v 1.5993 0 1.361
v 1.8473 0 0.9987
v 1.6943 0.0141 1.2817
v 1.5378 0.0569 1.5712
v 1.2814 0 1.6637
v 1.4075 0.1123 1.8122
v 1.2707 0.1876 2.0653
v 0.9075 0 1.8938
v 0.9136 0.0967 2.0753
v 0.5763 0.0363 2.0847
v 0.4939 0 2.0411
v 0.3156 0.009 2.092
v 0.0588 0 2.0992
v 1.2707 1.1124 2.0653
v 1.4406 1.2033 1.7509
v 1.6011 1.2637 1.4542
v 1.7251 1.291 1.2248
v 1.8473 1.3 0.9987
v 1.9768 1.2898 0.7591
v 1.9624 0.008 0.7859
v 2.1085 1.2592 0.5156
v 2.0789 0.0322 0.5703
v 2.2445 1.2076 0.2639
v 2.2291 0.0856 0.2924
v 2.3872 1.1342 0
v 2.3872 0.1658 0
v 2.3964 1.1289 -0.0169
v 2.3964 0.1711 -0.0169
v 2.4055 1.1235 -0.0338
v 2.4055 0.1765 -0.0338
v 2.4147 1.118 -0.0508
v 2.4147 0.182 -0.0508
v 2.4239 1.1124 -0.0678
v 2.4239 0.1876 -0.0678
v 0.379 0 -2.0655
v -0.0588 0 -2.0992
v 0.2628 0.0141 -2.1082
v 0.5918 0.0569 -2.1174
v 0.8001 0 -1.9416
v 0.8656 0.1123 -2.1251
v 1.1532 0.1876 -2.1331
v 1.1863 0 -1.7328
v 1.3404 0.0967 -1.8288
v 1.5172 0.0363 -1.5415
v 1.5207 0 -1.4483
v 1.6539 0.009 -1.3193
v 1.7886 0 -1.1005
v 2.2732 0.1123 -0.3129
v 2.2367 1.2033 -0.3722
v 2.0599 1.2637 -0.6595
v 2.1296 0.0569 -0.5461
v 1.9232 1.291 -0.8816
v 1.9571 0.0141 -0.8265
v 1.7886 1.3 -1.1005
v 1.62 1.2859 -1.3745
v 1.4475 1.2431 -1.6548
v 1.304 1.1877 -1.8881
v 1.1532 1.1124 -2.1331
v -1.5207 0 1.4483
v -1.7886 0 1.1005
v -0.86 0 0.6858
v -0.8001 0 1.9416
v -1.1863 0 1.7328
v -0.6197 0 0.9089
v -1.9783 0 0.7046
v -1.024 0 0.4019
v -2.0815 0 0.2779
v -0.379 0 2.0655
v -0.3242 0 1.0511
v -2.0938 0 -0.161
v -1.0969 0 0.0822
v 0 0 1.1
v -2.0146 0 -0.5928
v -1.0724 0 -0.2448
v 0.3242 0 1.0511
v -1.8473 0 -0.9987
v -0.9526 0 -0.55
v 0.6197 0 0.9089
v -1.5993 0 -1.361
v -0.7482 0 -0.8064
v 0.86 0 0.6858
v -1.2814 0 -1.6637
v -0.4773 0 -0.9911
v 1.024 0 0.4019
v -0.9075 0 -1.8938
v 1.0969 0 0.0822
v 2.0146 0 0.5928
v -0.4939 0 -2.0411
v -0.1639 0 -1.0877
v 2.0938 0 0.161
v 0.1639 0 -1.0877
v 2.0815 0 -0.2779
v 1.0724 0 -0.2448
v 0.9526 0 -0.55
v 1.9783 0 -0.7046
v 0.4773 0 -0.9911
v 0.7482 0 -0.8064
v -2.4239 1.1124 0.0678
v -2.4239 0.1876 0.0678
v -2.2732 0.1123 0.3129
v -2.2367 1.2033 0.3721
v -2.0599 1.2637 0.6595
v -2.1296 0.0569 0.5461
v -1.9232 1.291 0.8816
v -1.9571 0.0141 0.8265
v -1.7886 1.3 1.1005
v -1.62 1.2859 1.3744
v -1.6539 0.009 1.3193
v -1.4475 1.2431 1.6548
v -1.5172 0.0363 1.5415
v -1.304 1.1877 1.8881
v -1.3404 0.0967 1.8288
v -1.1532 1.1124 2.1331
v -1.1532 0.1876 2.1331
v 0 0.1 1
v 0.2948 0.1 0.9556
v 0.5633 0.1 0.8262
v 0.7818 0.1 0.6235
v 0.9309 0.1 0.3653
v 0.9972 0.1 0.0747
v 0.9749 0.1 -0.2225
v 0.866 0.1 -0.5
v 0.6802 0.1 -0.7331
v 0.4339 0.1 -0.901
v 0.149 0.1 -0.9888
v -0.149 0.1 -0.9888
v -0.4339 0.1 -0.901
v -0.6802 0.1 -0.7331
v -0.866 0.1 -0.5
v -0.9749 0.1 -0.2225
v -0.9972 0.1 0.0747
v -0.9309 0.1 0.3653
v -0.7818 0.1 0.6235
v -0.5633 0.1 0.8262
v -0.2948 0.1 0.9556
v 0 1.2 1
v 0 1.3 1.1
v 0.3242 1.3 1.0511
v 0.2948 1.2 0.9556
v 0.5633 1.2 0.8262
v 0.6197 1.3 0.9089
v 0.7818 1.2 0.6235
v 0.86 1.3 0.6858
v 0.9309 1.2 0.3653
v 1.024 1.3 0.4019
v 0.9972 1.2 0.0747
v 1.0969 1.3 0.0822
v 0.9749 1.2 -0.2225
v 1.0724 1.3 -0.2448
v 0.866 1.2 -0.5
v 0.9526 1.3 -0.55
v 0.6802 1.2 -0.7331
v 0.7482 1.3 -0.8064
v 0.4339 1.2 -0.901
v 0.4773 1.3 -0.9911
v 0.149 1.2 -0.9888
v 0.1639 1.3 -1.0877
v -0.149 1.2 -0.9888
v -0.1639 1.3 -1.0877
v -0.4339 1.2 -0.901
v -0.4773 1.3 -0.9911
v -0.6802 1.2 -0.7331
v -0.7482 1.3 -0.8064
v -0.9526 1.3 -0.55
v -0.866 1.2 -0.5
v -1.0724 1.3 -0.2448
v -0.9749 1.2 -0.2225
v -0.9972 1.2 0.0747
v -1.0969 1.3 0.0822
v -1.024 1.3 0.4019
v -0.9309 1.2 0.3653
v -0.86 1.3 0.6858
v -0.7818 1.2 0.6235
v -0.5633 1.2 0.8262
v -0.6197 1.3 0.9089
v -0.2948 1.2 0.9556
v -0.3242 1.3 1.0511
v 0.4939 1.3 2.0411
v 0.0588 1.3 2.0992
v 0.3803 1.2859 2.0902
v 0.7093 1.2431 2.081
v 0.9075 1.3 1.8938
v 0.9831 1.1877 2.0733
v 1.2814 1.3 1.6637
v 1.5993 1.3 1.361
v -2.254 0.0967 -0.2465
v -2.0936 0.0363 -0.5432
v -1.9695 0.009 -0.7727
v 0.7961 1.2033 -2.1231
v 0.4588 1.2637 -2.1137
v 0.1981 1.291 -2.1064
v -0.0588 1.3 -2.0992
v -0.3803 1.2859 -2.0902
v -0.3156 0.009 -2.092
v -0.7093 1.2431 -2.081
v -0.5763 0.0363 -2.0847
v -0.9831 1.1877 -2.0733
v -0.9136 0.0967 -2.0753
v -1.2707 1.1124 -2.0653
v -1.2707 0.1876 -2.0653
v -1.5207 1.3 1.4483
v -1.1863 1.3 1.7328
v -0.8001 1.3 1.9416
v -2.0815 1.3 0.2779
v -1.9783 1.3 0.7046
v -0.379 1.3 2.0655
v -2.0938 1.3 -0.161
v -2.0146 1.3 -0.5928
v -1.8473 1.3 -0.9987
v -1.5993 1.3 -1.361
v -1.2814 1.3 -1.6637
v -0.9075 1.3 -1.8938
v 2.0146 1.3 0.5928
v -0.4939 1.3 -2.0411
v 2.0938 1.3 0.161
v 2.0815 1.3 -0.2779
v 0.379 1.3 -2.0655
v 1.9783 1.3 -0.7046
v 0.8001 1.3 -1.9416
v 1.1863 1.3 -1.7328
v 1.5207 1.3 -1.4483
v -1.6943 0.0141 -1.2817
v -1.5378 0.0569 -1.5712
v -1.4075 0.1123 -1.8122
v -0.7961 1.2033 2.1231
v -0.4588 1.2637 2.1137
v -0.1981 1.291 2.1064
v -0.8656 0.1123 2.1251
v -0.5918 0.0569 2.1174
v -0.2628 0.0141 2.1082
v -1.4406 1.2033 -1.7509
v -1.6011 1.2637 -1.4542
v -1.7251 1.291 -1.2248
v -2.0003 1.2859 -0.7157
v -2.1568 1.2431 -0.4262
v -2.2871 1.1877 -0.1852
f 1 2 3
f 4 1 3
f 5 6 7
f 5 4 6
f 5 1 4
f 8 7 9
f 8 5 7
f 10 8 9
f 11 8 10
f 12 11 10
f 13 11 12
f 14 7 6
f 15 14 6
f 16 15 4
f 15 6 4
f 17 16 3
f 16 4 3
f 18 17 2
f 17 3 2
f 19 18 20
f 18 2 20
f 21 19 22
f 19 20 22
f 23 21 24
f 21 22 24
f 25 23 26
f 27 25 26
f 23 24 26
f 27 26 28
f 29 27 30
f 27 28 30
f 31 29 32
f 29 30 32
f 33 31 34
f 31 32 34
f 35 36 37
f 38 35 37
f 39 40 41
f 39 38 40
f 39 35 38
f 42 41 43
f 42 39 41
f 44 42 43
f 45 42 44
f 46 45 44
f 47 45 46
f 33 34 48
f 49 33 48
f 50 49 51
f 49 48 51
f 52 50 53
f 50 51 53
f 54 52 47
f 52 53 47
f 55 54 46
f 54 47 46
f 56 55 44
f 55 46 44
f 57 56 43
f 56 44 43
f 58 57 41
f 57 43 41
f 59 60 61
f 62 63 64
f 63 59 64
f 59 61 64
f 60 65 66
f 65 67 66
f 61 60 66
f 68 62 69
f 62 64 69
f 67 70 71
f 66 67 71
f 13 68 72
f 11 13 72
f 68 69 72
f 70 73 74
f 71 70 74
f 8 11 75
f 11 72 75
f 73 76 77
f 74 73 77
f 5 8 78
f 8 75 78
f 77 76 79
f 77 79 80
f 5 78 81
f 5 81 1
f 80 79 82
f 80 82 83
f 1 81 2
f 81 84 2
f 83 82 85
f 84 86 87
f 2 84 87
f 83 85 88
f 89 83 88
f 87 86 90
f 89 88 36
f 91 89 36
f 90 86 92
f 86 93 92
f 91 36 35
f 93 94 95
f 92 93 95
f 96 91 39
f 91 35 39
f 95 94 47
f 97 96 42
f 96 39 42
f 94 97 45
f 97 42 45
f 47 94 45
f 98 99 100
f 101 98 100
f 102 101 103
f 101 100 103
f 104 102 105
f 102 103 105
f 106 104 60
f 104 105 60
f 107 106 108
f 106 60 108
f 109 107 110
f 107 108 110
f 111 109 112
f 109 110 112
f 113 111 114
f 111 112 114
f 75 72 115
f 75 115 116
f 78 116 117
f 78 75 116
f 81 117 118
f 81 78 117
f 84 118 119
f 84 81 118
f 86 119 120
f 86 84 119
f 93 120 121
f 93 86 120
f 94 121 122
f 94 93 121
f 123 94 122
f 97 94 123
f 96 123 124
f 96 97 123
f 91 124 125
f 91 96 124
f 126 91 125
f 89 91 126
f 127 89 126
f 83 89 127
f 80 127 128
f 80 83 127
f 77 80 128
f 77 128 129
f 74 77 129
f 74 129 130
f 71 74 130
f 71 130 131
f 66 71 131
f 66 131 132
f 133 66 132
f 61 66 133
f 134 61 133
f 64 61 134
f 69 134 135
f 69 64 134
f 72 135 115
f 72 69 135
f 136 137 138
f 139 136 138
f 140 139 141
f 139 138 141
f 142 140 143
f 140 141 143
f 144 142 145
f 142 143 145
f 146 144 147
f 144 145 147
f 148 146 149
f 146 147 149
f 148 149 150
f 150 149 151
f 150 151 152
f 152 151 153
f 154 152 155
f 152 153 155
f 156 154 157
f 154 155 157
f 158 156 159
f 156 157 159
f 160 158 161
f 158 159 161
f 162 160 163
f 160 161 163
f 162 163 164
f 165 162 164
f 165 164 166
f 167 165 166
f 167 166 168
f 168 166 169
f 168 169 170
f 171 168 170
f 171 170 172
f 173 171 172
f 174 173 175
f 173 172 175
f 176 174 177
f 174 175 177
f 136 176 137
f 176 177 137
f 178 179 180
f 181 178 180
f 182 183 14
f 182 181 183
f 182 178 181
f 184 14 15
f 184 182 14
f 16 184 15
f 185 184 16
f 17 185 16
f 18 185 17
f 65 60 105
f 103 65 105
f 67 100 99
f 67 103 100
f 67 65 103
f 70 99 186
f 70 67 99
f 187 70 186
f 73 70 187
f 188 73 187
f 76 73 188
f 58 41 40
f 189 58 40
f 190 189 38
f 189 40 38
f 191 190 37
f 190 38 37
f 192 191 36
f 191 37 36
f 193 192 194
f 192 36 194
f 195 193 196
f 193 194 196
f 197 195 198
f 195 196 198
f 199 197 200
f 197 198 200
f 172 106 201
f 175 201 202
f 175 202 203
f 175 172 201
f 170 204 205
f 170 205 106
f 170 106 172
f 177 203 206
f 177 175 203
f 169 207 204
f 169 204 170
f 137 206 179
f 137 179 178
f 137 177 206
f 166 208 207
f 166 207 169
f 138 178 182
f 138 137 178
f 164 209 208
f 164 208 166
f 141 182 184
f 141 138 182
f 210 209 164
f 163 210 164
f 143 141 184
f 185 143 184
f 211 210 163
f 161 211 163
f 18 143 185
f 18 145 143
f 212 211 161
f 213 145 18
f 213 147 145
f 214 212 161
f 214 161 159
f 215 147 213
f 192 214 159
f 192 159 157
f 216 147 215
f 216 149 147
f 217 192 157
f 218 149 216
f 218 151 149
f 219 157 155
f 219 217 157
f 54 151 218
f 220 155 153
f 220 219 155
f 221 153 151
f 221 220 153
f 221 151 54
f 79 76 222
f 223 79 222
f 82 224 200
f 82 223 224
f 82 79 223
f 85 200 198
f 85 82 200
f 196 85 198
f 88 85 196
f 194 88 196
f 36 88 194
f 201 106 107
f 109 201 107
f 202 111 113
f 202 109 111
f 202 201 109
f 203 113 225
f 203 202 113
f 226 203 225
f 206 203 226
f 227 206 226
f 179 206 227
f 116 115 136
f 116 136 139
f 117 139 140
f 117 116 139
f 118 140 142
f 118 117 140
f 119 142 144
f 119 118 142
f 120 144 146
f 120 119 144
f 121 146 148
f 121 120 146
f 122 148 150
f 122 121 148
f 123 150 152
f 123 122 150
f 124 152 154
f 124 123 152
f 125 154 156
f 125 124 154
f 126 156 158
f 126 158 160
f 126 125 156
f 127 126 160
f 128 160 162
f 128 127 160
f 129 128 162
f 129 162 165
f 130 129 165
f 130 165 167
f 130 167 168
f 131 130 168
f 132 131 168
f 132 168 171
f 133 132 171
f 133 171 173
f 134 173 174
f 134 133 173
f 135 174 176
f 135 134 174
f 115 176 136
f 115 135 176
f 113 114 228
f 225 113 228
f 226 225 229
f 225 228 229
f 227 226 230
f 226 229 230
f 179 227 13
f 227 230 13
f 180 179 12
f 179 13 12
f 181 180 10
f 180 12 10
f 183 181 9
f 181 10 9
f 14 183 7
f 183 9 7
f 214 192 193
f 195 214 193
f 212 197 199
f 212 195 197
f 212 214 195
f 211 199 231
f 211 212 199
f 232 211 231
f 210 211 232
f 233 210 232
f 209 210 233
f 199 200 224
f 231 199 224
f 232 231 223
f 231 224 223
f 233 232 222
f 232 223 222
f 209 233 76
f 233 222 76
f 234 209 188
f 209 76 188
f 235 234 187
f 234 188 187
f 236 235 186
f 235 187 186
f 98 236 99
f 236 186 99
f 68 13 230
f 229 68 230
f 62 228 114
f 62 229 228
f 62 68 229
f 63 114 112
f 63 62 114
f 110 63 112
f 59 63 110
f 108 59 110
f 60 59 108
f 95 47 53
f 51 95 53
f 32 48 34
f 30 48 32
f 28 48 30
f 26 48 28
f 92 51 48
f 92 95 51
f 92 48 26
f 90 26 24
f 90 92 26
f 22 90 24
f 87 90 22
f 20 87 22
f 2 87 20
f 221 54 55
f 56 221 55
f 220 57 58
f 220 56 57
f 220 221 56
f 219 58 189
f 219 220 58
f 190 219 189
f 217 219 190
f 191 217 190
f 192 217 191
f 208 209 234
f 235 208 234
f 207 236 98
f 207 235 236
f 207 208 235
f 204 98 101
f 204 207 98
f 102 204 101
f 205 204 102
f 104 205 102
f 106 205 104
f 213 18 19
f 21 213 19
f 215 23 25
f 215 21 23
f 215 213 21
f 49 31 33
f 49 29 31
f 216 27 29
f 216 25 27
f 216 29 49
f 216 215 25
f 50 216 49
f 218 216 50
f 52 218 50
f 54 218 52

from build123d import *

# Parameters (mm, degrees)
SKETCH1_R           = 1
BOSS_EXTRUDE1_DEPTH = 1.3
SKETCH2_OUTSIDE_W   = 624.082
SKETCH2_OUTSIDE_H   = 623.5
SKETCH2_OUTSIDE_R   = 2.1
CUT_EXTRUDE1_DEPTH  = 177.8
CUT_EXTRUDE1_DRAFT  = -60
SKETCH3_OUTSIDE_W   = 624.082
SKETCH3_OUTSIDE_H   = 623.5
SKETCH3_OUTSIDE_R   = 2.1
CUT_EXTRUDE2_DEPTH  = 177.8
CUT_EXTRUDE2_DRAFT  = -60
CHAMFER1_SIZE       = 0.1
CHAMFER2_SIZE       = 0.1


with BuildPart() as part:
    # Sketch1 → Boss-Extrude1 (new body)
    with BuildSketch(Plane(origin=(0, 0, 0), x_dir=(1, 0, 0), z_dir=(0, 1, 0))):
        Polygon((1.153206949, 2.13309956), (-1.270714933, 2.065256294), (-2.423921882, -0.067843266), (-1.153206949, -2.13309956), (1.270714933, -2.065256294), (2.423921882, 0.067843266), align=None)
        with Locations(Location((0, 0, 0), (0, 0, 270))):
            Circle(SKETCH1_R, mode=Mode.SUBTRACT)
    extrude(amount=BOSS_EXTRUDE1_DEPTH)


with BuildPart() as cut_extrude1_tool:
    # Sketch2 outside → Cut-Extrude1 (with draft: the straight prism first)
    with BuildSketch(Plane(origin=(0, 1.3, 0), x_dir=(1, 0, 0), z_dir=(0, 1, 0))):
        Rectangle(SKETCH2_OUTSIDE_W, SKETCH2_OUTSIDE_H)
        Circle(SKETCH2_OUTSIDE_R, mode=Mode.SUBTRACT)
    extrude(amount=-CUT_EXTRUDE1_DEPTH)
    # Cut-Extrude1: the draft: its side faces are tilted about the plane it starts from
    cut_extrude1_sides = [cut_extrude1_tool.faces().sort_by_distance(p)[0] for p in [
        (0, -87.6, 311.75),
        (312.041, -87.6, 0),
        (0, -87.6, -311.75),
        (-312.041, -87.6, 0),
        (-2.1, -87.6, 0),
    ]]
    draft(cut_extrude1_sides, Plane(origin=(0, 1.3, 0), x_dir=(1, 0, 0), z_dir=(0, 1, 0)), CUT_EXTRUDE1_DRAFT)


with BuildPart() as part_1:
    add(part.part)

    # Cut-Extrude1: cut by cut_extrude1_tool
    add(cut_extrude1_tool.part, mode=Mode.SUBTRACT)


with BuildPart() as cut_extrude2_tool:
    # Sketch3 outside → Cut-Extrude2 (with draft: the straight prism first)
    with BuildSketch(Plane.XZ):
        Rectangle(SKETCH3_OUTSIDE_W, SKETCH3_OUTSIDE_H)
        Circle(SKETCH3_OUTSIDE_R, mode=Mode.SUBTRACT)
    extrude(amount=-CUT_EXTRUDE2_DEPTH)
    # Cut-Extrude2: the draft: its side faces are tilted about the plane it starts from
    cut_extrude2_sides = [cut_extrude2_tool.faces().sort_by_distance(p)[0] for p in [
        (0, 88.9, -311.75),
        (312.041, 88.9, 0),
        (0, 88.9, 311.75),
        (-312.041, 88.9, 0),
        (-2.1, 88.9, 0),
    ]]
    draft(cut_extrude2_sides, Plane.XZ, CUT_EXTRUDE2_DRAFT)


with BuildPart() as part_2:
    add(part_1.part)

    # Cut-Extrude2: cut by cut_extrude2_tool
    add(cut_extrude2_tool.part, mode=Mode.SUBTRACT)

    # Chamfer1
    chamfer1_edges = [part_2.edges().sort_by_distance(p)[0] for p in [
        (0, 1.3, -1),
    ]]
    chamfer(chamfer1_edges, length=CHAMFER1_SIZE)

    # Chamfer2
    chamfer2_edges = [part_2.edges().sort_by_distance(p)[0] for p in [
        (0, 0, -1),
    ]]
    chamfer(chamfer2_edges, length=CHAMFER2_SIZE)


solid = part_2.part
